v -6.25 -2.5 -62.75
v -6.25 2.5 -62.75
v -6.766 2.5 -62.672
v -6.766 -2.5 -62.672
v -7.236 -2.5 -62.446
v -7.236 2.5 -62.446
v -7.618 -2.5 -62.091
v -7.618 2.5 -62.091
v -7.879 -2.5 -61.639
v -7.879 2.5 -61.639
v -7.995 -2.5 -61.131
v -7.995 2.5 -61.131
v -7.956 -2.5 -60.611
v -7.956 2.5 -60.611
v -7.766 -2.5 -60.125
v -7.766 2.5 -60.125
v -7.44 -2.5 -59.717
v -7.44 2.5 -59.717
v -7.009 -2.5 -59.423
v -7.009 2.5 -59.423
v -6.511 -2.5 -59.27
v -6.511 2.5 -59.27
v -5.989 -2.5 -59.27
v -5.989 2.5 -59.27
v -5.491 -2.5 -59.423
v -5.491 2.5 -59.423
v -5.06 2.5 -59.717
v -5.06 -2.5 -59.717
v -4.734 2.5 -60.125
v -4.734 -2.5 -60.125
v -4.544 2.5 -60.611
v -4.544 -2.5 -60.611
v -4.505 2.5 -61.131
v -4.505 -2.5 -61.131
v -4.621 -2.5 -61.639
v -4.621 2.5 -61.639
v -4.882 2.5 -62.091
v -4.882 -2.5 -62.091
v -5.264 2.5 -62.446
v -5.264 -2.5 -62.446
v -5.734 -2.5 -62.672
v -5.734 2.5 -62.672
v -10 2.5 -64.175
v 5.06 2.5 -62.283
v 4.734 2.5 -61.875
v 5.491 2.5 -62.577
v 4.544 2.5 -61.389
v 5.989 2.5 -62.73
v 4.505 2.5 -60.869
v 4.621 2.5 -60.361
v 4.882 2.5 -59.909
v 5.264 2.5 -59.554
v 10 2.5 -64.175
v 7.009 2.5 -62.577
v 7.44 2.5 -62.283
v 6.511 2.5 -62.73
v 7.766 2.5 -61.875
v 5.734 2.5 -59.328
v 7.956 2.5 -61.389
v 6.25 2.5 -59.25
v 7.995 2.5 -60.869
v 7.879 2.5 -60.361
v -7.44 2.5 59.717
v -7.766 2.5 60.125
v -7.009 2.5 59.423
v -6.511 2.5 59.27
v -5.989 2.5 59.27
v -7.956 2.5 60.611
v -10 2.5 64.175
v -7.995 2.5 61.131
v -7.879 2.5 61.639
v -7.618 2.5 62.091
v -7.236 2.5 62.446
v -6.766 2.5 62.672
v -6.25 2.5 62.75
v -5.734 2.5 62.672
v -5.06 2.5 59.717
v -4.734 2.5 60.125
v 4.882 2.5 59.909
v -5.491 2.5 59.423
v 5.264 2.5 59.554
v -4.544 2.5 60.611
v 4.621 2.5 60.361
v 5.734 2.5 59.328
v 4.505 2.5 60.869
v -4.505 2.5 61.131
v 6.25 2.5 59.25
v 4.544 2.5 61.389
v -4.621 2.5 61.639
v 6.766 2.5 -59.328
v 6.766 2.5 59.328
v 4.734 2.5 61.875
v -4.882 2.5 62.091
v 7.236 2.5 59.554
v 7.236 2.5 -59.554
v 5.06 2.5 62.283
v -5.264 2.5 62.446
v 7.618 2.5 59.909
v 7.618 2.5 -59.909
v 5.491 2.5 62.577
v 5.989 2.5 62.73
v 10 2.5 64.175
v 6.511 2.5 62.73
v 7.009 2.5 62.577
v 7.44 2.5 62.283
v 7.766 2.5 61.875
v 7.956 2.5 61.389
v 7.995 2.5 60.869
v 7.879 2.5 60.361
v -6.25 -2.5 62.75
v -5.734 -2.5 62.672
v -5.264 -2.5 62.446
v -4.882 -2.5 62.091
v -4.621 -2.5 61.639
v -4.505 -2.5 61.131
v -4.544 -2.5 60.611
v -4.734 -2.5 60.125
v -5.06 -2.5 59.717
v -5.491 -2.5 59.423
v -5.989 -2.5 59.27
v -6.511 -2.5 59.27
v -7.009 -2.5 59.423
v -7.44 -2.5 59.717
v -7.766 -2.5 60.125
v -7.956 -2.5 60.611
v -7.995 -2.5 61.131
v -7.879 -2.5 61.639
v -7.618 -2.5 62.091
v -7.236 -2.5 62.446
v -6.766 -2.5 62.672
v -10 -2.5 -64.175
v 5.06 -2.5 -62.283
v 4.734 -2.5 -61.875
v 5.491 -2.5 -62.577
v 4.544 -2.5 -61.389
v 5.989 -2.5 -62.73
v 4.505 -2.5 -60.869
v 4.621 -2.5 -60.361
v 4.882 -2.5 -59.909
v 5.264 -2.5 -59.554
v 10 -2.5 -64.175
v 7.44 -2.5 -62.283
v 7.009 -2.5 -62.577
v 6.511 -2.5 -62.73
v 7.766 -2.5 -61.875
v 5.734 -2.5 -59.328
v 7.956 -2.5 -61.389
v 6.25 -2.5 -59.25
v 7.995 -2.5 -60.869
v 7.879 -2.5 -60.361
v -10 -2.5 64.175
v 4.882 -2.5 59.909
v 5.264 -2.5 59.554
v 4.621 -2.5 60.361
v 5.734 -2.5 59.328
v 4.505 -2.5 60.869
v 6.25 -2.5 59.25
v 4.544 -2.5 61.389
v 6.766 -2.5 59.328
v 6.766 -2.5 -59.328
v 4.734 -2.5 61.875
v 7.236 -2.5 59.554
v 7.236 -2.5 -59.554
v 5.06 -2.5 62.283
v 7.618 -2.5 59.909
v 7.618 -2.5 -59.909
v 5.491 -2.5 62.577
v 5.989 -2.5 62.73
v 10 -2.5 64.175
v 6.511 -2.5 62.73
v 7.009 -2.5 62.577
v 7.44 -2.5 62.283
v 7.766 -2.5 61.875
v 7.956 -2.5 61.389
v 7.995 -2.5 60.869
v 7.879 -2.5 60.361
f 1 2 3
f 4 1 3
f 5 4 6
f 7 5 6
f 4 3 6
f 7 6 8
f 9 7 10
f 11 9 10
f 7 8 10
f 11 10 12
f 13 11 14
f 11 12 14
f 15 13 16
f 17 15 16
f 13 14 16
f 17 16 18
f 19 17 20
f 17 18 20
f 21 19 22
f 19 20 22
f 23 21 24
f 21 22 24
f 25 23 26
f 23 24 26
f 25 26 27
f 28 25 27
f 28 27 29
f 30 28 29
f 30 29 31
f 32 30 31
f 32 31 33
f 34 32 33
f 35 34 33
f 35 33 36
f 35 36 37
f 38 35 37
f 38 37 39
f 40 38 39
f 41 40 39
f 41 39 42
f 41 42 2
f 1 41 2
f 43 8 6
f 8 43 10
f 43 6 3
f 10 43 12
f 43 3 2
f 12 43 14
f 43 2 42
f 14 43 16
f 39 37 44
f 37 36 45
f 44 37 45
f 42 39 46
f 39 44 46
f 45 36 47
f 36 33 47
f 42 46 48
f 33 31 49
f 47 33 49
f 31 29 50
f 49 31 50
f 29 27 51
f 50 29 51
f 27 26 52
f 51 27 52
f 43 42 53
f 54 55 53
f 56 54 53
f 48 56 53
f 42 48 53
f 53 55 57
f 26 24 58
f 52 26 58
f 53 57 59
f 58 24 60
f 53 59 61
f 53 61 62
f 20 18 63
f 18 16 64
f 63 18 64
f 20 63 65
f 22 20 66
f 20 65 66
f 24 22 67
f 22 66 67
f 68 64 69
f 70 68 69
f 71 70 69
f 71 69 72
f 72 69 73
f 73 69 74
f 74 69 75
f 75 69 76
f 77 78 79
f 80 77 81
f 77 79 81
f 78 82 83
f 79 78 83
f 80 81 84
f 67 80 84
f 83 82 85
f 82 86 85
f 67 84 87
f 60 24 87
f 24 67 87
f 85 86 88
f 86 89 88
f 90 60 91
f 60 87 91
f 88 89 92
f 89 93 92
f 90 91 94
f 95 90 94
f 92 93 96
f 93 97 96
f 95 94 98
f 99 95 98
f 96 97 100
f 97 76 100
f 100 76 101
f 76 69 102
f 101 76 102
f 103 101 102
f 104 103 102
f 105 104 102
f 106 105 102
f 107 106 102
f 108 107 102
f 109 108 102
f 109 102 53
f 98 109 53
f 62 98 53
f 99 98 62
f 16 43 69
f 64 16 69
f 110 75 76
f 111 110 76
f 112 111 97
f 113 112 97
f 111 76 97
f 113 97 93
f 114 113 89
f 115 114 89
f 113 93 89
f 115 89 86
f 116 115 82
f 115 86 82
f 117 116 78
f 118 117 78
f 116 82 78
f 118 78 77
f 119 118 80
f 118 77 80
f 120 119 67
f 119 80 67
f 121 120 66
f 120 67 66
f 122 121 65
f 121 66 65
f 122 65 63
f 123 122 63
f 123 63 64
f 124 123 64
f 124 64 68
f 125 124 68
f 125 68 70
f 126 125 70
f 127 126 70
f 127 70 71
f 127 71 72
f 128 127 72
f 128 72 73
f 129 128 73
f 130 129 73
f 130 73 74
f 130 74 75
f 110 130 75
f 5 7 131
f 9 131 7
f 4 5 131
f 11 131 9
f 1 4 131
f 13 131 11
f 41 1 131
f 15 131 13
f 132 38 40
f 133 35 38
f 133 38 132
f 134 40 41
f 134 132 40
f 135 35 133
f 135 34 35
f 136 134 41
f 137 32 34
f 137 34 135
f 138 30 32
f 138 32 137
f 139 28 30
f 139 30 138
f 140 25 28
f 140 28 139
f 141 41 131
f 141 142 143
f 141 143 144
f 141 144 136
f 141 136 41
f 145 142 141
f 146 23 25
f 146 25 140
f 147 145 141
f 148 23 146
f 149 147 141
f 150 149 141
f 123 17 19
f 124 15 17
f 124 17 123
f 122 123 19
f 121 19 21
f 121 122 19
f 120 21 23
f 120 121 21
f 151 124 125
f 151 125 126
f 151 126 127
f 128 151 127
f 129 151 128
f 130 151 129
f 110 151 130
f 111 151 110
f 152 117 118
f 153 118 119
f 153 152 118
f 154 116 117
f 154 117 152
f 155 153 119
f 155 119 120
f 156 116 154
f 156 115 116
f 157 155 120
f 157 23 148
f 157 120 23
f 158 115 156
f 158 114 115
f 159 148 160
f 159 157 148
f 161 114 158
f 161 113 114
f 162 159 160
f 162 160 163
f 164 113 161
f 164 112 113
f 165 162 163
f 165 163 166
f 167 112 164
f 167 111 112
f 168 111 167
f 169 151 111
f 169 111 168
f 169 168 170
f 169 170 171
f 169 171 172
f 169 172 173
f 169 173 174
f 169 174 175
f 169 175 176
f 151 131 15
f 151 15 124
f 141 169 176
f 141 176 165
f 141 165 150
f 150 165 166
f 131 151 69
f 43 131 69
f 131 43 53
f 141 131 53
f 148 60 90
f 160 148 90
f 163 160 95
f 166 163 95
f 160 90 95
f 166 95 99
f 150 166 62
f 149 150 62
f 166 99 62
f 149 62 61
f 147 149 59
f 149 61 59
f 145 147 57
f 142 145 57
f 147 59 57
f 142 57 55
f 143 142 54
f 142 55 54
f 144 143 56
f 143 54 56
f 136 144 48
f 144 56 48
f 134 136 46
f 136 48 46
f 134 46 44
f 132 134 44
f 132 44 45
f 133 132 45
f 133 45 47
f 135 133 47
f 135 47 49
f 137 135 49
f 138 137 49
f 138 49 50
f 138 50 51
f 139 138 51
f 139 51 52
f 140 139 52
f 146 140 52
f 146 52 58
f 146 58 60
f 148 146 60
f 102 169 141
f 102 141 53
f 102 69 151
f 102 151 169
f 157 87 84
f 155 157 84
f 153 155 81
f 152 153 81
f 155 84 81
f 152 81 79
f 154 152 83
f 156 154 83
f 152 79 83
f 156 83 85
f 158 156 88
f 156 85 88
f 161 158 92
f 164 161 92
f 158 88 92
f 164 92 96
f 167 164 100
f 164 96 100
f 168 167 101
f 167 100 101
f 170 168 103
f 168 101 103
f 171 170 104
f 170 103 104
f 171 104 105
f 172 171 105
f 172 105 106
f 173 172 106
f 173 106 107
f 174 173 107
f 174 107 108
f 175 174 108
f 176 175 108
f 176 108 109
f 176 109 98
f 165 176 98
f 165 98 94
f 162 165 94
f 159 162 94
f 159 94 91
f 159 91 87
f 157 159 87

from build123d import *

# Parameters (mm, degrees)
SKETCH1_W           = 20
SKETCH1_H           = 5
BOSS_EXTRUDE1_DEPTH = 64.175
SKETCH2_R           = 1.75
CUT_EXTRUDE1_DEPTH  = 66.14161976


with BuildPart() as part:
    # Sketch1 → Boss-Extrude1 (new, symmetric)
    with BuildSketch(Plane.XY):
        Rectangle(SKETCH1_W, SKETCH1_H)
    extrude(amount=BOSS_EXTRUDE1_DEPTH, both=True)

    # Sketch2 → Cut-Extrude1 (cut, through all)
    with BuildSketch(Plane(origin=(0, 2.5, 0), x_dir=(1, 0, 0), z_dir=(0, 1, 0))):
        with Locations(Location((-6.25, -61, 0), (0, 0, 270))):
            Circle(SKETCH2_R)
        with Locations(Location((6.25, -61, 0), (0, 0, 90))):
            Circle(SKETCH2_R)
        with Locations(Location((6.25, 61, 0), (0, 0, 270))):
            Circle(SKETCH2_R)
        with Locations(Location((-6.25, 61, 0), (0, 0, 90))):
            Circle(SKETCH2_R)
    extrude(amount=-CUT_EXTRUDE1_DEPTH, mode=Mode.SUBTRACT)


solid = part.part
